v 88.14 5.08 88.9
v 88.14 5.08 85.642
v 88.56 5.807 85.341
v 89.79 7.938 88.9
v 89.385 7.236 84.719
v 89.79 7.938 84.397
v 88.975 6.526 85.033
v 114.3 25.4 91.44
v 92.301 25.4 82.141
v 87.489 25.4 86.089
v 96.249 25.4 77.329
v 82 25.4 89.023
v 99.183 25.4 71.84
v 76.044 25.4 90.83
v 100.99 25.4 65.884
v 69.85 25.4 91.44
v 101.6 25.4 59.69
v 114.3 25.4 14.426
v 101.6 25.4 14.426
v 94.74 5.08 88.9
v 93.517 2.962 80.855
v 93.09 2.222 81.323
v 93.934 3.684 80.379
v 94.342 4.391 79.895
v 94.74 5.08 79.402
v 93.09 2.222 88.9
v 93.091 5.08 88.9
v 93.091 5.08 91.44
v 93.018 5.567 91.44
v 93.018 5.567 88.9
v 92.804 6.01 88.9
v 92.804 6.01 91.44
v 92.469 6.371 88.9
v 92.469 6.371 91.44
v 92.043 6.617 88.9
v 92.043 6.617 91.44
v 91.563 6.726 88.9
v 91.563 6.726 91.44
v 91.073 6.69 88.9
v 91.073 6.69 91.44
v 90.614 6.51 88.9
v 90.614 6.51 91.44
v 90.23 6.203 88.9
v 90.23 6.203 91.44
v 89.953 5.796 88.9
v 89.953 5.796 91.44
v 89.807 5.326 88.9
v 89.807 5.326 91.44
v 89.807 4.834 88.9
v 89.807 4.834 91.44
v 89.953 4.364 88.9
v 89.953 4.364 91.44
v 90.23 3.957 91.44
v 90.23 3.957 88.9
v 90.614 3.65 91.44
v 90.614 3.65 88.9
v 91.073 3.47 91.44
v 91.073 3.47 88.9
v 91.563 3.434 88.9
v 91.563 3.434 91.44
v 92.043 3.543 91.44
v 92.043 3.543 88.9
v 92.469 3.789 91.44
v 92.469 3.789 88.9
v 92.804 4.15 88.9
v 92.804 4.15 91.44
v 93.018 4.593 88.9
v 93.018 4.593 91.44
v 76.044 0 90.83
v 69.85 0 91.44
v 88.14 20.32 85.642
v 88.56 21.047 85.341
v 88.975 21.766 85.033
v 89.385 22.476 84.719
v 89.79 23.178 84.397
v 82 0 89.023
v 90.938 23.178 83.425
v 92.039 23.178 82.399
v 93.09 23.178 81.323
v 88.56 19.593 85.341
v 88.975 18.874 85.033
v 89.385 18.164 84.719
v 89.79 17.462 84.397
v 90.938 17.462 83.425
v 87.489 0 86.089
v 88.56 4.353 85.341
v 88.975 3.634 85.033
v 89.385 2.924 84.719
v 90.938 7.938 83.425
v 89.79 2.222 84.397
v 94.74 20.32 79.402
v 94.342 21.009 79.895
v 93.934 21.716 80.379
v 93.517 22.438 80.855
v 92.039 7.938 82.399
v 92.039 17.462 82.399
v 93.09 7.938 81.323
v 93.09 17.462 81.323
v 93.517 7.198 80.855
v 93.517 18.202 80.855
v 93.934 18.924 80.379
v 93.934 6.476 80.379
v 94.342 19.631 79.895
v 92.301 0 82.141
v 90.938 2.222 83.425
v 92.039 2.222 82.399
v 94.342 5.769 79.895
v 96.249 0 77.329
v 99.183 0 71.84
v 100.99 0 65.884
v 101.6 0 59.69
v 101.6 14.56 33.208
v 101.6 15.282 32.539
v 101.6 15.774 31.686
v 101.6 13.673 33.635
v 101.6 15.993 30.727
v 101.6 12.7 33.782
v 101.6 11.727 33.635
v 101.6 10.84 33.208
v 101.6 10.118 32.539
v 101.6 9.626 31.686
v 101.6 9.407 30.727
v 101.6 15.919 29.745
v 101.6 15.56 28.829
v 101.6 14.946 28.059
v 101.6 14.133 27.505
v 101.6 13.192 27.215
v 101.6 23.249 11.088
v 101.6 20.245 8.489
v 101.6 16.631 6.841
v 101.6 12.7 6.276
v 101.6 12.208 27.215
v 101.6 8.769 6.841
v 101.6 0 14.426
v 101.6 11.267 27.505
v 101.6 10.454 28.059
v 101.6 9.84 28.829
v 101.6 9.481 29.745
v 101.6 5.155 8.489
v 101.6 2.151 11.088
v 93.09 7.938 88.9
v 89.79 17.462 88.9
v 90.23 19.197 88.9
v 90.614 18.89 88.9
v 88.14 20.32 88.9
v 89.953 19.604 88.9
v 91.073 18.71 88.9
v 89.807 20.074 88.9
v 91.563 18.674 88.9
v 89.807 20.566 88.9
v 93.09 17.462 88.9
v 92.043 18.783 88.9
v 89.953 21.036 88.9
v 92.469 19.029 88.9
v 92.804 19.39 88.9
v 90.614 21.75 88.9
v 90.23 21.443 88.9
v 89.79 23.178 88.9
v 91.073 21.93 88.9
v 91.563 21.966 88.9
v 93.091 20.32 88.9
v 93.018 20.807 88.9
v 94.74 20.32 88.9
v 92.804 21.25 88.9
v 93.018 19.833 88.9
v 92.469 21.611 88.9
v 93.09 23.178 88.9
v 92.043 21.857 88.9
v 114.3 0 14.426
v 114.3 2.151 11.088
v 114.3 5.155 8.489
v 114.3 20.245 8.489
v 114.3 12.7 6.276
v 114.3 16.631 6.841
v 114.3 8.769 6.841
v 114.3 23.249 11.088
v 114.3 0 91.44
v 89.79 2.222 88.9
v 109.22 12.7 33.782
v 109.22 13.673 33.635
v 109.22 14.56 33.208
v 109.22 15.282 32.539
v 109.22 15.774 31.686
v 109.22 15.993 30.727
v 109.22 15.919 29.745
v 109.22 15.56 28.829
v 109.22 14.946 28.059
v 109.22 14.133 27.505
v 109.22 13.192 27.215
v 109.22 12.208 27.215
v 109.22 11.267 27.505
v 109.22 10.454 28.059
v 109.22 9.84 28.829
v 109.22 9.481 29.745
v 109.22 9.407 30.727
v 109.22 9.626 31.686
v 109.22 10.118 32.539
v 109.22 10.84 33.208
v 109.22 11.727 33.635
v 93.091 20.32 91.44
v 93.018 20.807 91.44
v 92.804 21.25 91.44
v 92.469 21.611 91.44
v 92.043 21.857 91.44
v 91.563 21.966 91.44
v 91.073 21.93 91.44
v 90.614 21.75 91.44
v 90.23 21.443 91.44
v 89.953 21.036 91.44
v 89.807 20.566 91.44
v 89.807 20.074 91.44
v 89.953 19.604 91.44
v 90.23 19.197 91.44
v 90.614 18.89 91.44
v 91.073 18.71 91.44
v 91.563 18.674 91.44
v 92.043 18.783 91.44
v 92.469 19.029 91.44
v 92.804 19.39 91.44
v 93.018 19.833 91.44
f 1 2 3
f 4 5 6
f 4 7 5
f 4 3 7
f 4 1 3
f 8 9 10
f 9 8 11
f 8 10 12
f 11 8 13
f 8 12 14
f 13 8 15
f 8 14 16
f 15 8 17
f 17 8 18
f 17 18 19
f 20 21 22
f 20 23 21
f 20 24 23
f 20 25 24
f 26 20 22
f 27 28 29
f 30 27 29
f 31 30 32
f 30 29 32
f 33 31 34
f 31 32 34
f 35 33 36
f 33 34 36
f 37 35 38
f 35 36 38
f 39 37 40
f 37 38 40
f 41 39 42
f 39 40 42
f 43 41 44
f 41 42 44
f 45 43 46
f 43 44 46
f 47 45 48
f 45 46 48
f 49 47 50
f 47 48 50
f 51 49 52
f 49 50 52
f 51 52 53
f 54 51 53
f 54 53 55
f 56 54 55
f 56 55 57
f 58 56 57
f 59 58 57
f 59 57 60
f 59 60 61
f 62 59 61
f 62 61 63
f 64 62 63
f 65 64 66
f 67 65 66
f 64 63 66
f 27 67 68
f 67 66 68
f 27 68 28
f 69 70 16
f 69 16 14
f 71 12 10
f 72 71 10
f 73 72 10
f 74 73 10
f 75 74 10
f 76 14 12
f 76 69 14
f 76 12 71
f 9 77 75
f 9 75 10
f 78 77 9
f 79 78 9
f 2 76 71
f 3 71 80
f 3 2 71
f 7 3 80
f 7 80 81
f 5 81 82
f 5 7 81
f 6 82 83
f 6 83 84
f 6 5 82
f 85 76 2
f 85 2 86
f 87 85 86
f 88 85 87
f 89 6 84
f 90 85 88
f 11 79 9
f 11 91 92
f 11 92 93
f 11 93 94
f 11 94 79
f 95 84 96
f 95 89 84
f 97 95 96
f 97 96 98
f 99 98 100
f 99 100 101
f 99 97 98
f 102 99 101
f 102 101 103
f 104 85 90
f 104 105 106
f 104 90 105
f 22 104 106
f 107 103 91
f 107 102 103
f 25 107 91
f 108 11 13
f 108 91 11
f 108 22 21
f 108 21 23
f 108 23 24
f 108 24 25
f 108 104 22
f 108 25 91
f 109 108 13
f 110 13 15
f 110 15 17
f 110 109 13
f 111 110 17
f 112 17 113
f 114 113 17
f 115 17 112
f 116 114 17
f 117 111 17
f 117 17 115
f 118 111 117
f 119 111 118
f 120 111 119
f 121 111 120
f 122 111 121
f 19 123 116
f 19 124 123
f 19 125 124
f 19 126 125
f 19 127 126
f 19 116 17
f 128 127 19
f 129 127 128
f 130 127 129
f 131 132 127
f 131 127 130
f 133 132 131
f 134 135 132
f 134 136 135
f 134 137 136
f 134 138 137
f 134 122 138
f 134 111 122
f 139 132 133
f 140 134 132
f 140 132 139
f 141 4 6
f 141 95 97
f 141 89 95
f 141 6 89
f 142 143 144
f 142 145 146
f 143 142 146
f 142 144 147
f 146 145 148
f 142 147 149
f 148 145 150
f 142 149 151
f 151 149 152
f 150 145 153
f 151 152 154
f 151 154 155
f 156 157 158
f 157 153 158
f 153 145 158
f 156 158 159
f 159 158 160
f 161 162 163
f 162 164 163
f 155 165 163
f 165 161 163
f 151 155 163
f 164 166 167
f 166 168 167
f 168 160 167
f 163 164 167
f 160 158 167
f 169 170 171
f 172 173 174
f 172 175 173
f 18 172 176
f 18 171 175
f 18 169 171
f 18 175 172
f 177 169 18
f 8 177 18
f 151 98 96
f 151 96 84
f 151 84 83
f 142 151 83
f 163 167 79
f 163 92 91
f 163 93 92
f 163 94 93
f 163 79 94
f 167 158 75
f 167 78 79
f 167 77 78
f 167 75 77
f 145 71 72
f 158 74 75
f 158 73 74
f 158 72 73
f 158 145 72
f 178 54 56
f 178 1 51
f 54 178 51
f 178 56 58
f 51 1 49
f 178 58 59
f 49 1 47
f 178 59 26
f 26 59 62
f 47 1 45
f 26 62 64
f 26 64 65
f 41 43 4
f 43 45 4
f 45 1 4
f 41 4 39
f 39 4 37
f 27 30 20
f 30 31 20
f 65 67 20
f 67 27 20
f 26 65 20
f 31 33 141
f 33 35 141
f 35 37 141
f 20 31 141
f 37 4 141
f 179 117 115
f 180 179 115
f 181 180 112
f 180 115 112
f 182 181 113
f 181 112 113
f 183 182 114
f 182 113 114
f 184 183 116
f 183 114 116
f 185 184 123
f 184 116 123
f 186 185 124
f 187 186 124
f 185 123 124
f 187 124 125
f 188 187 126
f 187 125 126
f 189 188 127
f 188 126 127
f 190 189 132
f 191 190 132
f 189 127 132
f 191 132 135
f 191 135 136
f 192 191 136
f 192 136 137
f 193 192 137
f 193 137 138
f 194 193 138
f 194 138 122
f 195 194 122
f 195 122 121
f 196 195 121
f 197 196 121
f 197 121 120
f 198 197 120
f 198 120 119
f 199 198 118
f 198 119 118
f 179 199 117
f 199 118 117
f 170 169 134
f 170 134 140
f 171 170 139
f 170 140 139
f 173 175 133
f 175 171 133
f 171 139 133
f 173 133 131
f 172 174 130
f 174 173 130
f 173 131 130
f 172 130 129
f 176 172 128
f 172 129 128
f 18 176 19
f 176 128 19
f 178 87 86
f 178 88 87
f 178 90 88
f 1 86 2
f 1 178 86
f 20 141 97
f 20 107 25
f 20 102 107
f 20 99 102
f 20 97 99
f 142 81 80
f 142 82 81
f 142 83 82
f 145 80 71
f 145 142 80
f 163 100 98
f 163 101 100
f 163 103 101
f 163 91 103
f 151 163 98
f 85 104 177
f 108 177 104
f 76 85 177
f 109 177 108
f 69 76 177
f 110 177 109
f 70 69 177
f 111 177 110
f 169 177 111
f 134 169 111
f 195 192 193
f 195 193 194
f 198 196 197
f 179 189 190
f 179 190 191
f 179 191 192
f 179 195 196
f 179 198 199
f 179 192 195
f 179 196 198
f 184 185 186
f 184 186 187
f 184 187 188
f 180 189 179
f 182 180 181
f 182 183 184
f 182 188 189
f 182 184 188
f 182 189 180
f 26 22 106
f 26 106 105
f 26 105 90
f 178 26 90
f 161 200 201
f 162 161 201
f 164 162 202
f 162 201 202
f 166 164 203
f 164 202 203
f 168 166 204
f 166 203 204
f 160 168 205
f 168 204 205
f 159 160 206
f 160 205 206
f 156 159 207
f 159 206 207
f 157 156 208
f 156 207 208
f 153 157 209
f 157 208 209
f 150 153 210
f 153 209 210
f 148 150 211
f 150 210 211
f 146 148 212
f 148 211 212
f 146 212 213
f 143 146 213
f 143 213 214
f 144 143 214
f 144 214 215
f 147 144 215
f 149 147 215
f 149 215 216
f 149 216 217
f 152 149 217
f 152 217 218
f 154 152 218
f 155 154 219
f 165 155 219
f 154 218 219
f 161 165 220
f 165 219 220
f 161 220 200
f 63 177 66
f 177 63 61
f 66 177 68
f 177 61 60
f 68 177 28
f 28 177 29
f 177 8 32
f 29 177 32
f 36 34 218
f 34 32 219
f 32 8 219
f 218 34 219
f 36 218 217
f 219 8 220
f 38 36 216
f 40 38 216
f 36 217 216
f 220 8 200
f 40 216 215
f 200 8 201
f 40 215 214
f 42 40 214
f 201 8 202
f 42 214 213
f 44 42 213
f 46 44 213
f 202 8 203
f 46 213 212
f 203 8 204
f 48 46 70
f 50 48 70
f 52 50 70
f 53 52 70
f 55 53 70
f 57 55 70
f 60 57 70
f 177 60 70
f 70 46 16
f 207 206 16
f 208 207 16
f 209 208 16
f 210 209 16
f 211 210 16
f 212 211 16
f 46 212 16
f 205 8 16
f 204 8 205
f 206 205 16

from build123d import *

# Parameters (mm, degrees)
BOSS_EXTRUDE1_DEPTH     = 25.4
SKETCH4_R               = 3.302
CUT_EXTRUDE2_DEPTH      = 7.62
SKETCH2_R               = 1.5875
SKETCH2_R_2             = 3.302
CUT_EXTRUDE3_DEPTH      = 7.62
SKETCH6_W               = 121.92
SKETCH6_H               = 12.7
BOSS_EXTRUDE2_DEPTH     = 7.62
CUT_EXTRUDE4_DEPTH      = 3.81
SKETCH10_R              = 2.921
CUT_EXTRUDE5_DEPTH      = 3.048
SKETCH11_R              = 1.5875
CUT_EXTRUDE6_DEPTH      = 96.25
CUT_EXTRUDE7_REACH      = 101.06
SKETCH12_W              = 8.89
SKETCH12_H              = 20.32
CUT_EXTRUDE8_DEPTH      = 1
CUT_EXTRUDE8_DEPTH_BACK = 122.92
CUT_EXTRUDE9_DEPTH      = 86.163777405
SKETCH16_W              = 44.941172762
SKETCH16_H              = 85.163777405
CUT_EXTRUDE10_DEPTH     = 51.8
SKETCH18_R              = 4.468004781
SKETCH18_R_2            = 4.110212911
BOSS_EXTRUDE3_DEPTH     = 2.54
SKETCH19_R              = 1.651
CUT_EXTRUDE11_DEPTH     = 2.54


with BuildPart() as part:
    # Sketch1 → Boss-Extrude1 (new body)
    with BuildSketch(Plane(origin=(0, 0, 0), x_dir=(1, 0, 0), z_dir=(0, 1, 0))):
        with BuildLine():
            Line((0, 0), (0, -59.69))
            ThreePointArc((0, -59.69), (9.299359697, -82.140640303), (31.75, -91.44))
            Line((31.75, -91.44), (69.85, -91.44))
            ThreePointArc((69.85, -91.44), (92.300640303, -82.140640303), (101.6, -59.69))
            Line((101.6, -59.69), (101.6, 0))
            Line((101.6, 0), (114.3, 0))
            Line((114.3, 0), (114.3, -99.06))
            Line((114.3, -99.06), (-7.62, -99.06))
            Line((-7.62, -99.06), (-7.62, 0))
            Line((-7.62, 0), (0, 0))
        make_face()
    extrude(amount=BOSS_EXTRUDE1_DEPTH)

    # Sketch4 → Cut-Extrude2 (cut)
    with BuildSketch(Plane.ZY.offset(-101.6)):
        with Locations((30.48, 12.7)):
            Circle(SKETCH4_R)
    extrude(amount=-CUT_EXTRUDE2_DEPTH, mode=Mode.SUBTRACT)

    # Sketch2 → Cut-Extrude3 (cut)
    with BuildSketch(Plane(origin=(0, 0, 0), x_dir=(0, 0, -1), z_dir=(1, 0, 0))):
        with Locations((-15.24, 12.7)):
            Circle(SKETCH2_R)
        with Locations((-45.72, 12.7)):
            Circle(SKETCH2_R)
        with Locations((-30.48, 12.7)):
            Circle(SKETCH2_R_2)
    extrude(amount=-CUT_EXTRUDE3_DEPTH, mode=Mode.SUBTRACT)

    # Sketch6 → Boss-Extrude2 (add)
    with BuildSketch(Plane.XY.offset(99.06)):
        with Locations((53.34, 31.75)):
            Rectangle(SKETCH6_W, SKETCH6_H)
        with Locations((53.34, -6.35)):
            Rectangle(SKETCH6_W, SKETCH6_H)
    extrude(amount=-BOSS_EXTRUDE2_DEPTH)

    # Sketch7 → Cut-Extrude4 (cut)
    with BuildSketch(Plane.XY.offset(99.06)):
        Polygon((12.284426472, 29.21), (9.901413236, 33.3375), (5.135386764, 33.3375), (2.752373528, 29.21), (5.135386764, 25.0825), (9.901413236, 25.0825), align=None)
        Polygon((103.724426472, -3.81), (101.341413236, 0.3175), (96.575386764, 0.3175), (94.192373528, -3.81), (96.575386764, -7.9375), (101.341413236, -7.9375), align=None)
    extrude(amount=-CUT_EXTRUDE4_DEPTH, mode=Mode.SUBTRACT)

    # Sketch10 → Cut-Extrude5 (cut)
    with BuildSketch(Plane.ZY.offset(7.62)):
        with Locations((15.24, 12.7)):
            Circle(SKETCH10_R)
        with Locations((45.72, 12.7)):
            Circle(SKETCH10_R)
    extrude(amount=-CUT_EXTRUDE5_DEPTH, mode=Mode.SUBTRACT)

    # Sketch11 → Cut-Extrude6 (cut, through all)
    with BuildSketch(Plane.XY.offset(95.25)):
        with Locations((7.5184, 29.21)):
            Circle(SKETCH11_R)
        with Locations((98.9584, -3.81)):
            Circle(SKETCH11_R)
    extrude(amount=-CUT_EXTRUDE6_DEPTH, mode=Mode.SUBTRACT)

    # Sketch12 → Cut-Extrude7 (cut, up to next)
    with BuildSketch(Plane.XY.offset(99.06), mode=Mode.PRIVATE) as cut_extrude7_sk1:
        with Locations((62.8396, 12.7)):
            Rectangle(SKETCH12_W, SKETCH12_H)
    cut_extrude7_tool1 = extrude(cut_extrude7_sk1.sketch, amount=-CUT_EXTRUDE7_REACH, mode=Mode.PRIVATE) & part.part
    add(cut_extrude7_tool1.solids().sort_by_distance((62.8396, 12.7, 99.06))[0], mode=Mode.SUBTRACT)

    # Sketch14 → Cut-Extrude8 (cut, two sides)
    with BuildSketch(Plane.ZY.offset(7.62)) as cut_extrude8_sk:
        with BuildLine():
            Line((14.426351463, 25.4), (0, 25.4))
            Line((0, 25.4), (0, 0))
            Line((0, 0), (14.426351463, 0))
            ThreePointArc((14.426351463, 0), (6.276222595, 12.7), (14.426351463, 25.4))
        make_face()
    extrude(amount=CUT_EXTRUDE8_DEPTH, mode=Mode.SUBTRACT)
    extrude(cut_extrude8_sk.sketch, amount=-CUT_EXTRUDE8_DEPTH_BACK, mode=Mode.SUBTRACT)

    # Sketch15 → Cut-Extrude9 (cut, through all)
    with BuildSketch(Plane(origin=(0, 0, 91.44), x_dir=(-1, 0, 0), z_dir=(0, 0, -1))):
        Polygon((-88.140443212, 20.32), (-89.790221606, 23.1775), (-93.089778394, 23.1775), (-94.739556788, 20.32), (-93.089778394, 17.4625), (-89.790221606, 17.4625), align=None)
        Polygon((-88.140443212, 5.08), (-89.790221606, 7.9375), (-93.089778394, 7.9375), (-94.739556788, 5.08), (-93.089778394, 2.2225), (-89.790221606, 2.2225), align=None)
    extrude(amount=CUT_EXTRUDE9_DEPTH, mode=Mode.SUBTRACT)

    # Sketch16 → Cut-Extrude10 (cut, through all)
    with BuildSketch(Plane(origin=(0, 38.1, 0), x_dir=(1, 0, 0), z_dir=(0, 1, 0))):
        Polygon((114.3, -99.06), (114.3, -91.44), (37.321172762, -91.44), (-7.62, -91.44), (-7.62, -99.06), align=None)
        with Locations((14.850586381, -48.858111298)):
            Rectangle(SKETCH16_W, SKETCH16_H)
    extrude(amount=-CUT_EXTRUDE10_DEPTH, mode=Mode.SUBTRACT)

    # Sketch18 → Boss-Extrude3 (add)
    with BuildSketch(Plane.XY.offset(91.44)):
        with Locations((91.226718038, 20.521889117)):
            Circle(SKETCH18_R)
        with Locations((91.757737736, 5.016113912)):
            Circle(SKETCH18_R_2)
    extrude(amount=-BOSS_EXTRUDE3_DEPTH)

    # Sketch19 → Cut-Extrude11 (cut)
    with BuildSketch(Plane.XY.offset(91.44)):
        with Locations((91.44, 20.32)):
            Circle(SKETCH19_R)
        with Locations((91.44, 5.08)):
            Circle(SKETCH19_R)
    extrude(amount=-CUT_EXTRUDE11_DEPTH, mode=Mode.SUBTRACT)


solid = part.part
